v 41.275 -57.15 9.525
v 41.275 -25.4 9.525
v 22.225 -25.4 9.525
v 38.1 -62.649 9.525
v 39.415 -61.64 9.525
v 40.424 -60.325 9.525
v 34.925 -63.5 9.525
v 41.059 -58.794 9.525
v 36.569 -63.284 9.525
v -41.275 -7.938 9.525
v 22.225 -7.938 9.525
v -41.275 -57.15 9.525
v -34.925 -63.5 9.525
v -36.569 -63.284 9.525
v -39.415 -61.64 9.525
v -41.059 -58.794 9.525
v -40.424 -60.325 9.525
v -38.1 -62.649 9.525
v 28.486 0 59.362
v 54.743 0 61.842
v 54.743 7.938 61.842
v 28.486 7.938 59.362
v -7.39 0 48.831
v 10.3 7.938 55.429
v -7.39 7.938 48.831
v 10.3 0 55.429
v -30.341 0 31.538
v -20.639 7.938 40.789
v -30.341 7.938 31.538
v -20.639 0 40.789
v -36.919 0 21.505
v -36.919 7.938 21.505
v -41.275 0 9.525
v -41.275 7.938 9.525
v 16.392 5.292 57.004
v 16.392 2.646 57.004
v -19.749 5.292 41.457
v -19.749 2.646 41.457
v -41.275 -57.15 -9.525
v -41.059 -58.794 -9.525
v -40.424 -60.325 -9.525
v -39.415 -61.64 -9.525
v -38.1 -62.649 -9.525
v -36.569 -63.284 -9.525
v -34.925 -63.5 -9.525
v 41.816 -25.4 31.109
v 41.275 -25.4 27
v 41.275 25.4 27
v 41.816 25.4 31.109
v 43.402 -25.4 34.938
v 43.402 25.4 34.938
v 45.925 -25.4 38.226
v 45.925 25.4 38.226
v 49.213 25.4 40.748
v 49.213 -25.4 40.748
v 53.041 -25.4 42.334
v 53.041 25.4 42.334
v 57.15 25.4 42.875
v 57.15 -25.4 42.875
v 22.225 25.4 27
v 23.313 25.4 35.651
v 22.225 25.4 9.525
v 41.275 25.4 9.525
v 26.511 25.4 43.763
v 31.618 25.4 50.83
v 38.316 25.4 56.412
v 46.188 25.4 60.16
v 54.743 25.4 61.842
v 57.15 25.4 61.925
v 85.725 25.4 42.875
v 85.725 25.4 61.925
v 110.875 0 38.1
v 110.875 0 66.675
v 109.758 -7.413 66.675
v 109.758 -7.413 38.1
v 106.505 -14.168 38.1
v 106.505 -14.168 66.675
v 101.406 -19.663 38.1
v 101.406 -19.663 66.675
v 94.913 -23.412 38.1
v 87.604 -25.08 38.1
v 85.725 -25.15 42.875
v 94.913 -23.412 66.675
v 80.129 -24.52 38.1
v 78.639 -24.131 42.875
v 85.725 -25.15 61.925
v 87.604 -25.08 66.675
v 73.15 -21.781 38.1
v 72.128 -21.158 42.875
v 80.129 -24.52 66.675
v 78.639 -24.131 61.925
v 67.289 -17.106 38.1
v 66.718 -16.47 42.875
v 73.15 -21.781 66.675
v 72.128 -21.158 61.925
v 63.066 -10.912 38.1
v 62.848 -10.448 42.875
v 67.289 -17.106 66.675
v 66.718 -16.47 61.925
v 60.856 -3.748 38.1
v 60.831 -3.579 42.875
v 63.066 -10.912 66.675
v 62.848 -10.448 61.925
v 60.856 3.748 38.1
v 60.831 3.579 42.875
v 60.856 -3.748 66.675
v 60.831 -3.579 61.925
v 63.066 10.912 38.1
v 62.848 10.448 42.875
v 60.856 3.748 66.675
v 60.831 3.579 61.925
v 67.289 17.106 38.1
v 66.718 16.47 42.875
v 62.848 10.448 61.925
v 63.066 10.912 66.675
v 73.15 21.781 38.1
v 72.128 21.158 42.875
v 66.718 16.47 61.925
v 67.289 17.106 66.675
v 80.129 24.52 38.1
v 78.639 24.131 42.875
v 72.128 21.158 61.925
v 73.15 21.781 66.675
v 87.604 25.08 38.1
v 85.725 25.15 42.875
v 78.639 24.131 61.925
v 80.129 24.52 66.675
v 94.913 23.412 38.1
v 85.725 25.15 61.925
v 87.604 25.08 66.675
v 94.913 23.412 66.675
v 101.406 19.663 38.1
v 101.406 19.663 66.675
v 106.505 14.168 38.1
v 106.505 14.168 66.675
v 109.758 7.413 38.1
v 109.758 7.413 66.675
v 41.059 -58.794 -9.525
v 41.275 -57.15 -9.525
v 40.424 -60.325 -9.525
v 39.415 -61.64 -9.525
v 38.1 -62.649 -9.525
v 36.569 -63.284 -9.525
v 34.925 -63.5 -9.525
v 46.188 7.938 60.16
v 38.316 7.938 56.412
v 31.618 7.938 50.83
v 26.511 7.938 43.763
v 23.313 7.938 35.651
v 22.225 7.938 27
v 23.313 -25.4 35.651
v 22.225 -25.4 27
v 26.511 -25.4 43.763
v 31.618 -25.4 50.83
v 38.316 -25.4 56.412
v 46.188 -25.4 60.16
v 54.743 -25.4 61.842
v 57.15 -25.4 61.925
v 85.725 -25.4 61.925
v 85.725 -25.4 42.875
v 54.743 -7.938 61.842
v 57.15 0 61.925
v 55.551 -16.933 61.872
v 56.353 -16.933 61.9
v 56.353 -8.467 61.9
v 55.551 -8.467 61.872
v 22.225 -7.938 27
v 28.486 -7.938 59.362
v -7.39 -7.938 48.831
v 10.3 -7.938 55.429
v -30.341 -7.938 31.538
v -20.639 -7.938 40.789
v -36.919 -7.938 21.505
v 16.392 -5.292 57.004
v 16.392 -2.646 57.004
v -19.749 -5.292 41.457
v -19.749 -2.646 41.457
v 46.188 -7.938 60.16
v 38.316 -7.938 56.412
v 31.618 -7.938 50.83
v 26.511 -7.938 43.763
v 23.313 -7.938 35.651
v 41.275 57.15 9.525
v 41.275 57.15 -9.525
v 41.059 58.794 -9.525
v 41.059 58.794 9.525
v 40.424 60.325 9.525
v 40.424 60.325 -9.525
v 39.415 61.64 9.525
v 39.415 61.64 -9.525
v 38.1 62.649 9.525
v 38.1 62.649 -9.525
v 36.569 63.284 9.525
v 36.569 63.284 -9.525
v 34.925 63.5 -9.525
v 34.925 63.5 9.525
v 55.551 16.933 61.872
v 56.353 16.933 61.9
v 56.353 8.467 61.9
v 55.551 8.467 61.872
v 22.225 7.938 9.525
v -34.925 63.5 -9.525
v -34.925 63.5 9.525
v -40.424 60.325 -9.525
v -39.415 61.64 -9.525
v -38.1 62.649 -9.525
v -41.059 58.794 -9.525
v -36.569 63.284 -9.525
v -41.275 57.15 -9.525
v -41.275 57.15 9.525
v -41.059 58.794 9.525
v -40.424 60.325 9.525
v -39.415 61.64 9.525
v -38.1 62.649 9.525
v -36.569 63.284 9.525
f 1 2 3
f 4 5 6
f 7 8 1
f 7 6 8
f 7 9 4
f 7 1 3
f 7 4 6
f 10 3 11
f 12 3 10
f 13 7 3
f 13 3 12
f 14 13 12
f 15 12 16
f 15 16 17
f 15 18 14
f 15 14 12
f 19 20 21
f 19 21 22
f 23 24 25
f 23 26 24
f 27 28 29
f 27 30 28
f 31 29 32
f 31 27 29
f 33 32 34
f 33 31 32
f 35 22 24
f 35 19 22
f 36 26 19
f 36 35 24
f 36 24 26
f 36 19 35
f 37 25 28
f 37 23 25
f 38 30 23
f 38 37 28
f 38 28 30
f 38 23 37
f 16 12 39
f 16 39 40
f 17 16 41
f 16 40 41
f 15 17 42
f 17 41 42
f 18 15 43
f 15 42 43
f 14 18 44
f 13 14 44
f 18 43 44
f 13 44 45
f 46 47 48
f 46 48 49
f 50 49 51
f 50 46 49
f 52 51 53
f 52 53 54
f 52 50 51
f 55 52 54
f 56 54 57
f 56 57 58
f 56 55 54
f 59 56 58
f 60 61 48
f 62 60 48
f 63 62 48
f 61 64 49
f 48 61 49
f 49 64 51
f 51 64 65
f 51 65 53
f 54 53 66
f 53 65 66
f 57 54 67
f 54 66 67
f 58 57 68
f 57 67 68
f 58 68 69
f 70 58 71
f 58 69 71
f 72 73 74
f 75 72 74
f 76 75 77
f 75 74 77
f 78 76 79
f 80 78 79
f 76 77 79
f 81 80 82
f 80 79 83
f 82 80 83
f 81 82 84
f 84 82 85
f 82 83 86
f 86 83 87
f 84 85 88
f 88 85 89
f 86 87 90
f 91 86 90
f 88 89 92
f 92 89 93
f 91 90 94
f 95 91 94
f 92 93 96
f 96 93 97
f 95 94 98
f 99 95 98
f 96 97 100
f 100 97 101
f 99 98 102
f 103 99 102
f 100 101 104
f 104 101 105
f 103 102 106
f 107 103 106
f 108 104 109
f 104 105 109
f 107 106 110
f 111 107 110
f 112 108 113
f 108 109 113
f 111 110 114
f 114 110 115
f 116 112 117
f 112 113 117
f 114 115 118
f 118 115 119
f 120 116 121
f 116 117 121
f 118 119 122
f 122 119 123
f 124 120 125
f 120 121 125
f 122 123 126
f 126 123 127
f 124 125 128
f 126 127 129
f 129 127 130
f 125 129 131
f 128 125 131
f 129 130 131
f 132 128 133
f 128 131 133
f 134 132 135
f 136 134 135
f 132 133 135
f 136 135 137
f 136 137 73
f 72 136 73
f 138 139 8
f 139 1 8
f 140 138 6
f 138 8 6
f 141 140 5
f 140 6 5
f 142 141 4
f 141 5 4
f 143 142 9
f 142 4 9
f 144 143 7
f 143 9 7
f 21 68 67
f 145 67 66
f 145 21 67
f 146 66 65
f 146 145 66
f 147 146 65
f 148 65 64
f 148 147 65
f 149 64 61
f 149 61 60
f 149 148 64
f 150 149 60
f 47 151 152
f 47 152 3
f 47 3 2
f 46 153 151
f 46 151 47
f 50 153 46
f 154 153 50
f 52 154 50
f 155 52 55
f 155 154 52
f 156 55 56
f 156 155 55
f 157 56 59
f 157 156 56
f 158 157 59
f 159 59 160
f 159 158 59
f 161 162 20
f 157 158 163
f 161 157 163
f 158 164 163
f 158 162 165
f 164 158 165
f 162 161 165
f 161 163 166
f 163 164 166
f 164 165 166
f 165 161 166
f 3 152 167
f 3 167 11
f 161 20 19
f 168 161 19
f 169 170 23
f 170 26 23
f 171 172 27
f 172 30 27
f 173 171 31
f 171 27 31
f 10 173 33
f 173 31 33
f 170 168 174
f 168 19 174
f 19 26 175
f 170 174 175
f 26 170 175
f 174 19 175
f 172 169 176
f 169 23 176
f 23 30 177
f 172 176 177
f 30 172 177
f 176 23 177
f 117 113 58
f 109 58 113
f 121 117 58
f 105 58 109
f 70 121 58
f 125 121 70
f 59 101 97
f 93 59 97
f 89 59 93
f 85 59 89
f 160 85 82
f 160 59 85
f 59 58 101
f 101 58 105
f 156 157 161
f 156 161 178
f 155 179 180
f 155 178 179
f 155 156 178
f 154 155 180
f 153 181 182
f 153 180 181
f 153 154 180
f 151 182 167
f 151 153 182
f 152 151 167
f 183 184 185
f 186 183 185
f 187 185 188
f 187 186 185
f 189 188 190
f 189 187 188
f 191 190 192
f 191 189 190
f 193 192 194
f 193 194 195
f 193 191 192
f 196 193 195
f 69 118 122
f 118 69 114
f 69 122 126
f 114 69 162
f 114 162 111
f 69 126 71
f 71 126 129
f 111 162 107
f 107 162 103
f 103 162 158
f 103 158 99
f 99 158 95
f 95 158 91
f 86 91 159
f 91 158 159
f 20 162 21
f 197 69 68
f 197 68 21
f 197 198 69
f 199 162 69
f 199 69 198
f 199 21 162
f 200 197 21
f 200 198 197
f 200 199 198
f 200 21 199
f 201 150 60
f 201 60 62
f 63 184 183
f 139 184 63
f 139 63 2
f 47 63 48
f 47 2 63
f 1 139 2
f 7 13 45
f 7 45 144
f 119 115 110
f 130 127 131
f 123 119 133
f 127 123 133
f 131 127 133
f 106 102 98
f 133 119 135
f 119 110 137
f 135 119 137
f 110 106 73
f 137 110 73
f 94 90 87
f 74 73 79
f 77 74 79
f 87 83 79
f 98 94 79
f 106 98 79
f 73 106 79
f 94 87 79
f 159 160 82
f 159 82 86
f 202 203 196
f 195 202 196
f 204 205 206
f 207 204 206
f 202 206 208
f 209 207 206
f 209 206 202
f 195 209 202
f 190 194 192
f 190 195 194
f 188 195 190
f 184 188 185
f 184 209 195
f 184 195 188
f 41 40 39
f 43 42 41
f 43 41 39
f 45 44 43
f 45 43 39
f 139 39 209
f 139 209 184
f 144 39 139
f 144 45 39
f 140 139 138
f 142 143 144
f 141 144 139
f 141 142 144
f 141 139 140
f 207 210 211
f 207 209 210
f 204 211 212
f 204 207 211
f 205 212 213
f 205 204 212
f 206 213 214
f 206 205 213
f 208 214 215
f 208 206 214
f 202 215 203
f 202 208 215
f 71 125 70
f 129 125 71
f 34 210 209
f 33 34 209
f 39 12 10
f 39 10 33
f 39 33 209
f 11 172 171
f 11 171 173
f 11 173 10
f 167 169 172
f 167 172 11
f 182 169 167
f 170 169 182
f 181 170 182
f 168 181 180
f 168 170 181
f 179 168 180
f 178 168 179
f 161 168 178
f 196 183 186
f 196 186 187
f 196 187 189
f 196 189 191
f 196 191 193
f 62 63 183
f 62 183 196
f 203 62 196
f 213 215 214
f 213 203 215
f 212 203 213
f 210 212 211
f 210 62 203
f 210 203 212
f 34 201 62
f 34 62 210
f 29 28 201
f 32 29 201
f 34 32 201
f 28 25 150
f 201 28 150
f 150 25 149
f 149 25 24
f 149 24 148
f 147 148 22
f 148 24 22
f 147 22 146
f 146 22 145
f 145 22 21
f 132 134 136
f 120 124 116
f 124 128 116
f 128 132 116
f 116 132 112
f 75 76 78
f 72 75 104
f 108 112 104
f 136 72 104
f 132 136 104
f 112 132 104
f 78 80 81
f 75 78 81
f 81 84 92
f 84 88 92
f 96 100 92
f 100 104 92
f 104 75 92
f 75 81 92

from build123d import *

# Parameters (mm, degrees)
F1_DEPTH = 63.5
F2_DEPTH = 25.4
F3_DEPTH = 7.9375
F0_W     = 25.6498904824
F0_H     = 19.05
F4_DEPTH = 25.4
F6_R     = 6.35


with BuildPart() as f1:
    # F0 (on Front) → F1 (new body, symmetric)
    with BuildSketch(Plane.XZ):
        Polygon((41.275, -9.525), (41.275, 9.525), (22.225, 9.525), (-41.275, 9.525), (-41.275, -9.525), align=None)
    extrude(amount=F1_DEPTH, both=True)

    # F0 (on Front) → F2 (join, symmetric)
    with BuildSketch(Plane.XZ):
        with BuildLine():
            Line((22.225, 9.525), (41.275, 9.525))
            Line((41.275, 9.525), (41.275, 27.0002))
            ThreePointArc((41.275, 27.0002), (45.9246798487, 38.2255201513), (57.15, 42.8752))
            Line((57.15, 42.8752), (60.0751095176, 42.8752))
            Line((60.0751095176, 42.8752), (60.0751095176, 61.9252))
            Line((60.0751095176, 61.9252), (57.15, 61.9252))
            add(Edge.make_bspline(
                [(57.15, 61.9252), (56.3562246921, 61.9012944132), (55.5537204814, 61.8737200554), (54.7431620422, 61.8421683147)],
                knots=[0, 0, 0, 0, 2.5014710885, 2.5014710885, 2.5014710885, 2.5014710885], degree=3))
            ThreePointArc((54.7431620422, 61.8421683147), (31.617526161, 50.8297699639), (22.225, 27.0002))
            Line((22.225, 27.0002), (22.225, 9.525))
        make_face()
    extrude(amount=F2_DEPTH, both=True)

    # F0 (on Front) → F3 (join, symmetric)
    with BuildSketch(Plane.XZ):
        with BuildLine():
            Line((-41.275, 9.525), (22.225, 9.525))
            Line((22.225, 9.525), (22.225, 27.0002))
            ThreePointArc((22.225, 27.0002), (31.617526161, 50.8297699639), (54.7431620422, 61.8421683147))
            add(Edge.make_bspline(
                [(54.7431620422, 61.8421683147), (19.4226041922, 60.4672827696), (-31.1915768934, 51.5400171012), (-41.275, 9.525)],
                knots=[2.5014710885, 2.5014710885, 2.5014710885, 2.5014710885, 111.5045361635, 111.5045361635, 111.5045361635, 111.5045361635], degree=3))
        make_face()
    extrude(amount=F3_DEPTH, both=True)

    # F0 (on Front) → F4 (join, symmetric)
    with BuildSketch(Plane.XZ):
        with Locations((72.9000547588, 52.4002)):
            Rectangle(F0_W, F0_H)
    extrude(amount=F4_DEPTH, both=True)

    # F0 (on Front) → F5 (revolve)
    with BuildSketch(Plane.XZ):
        Polygon((85.725, 61.9252), (85.725, 42.8752), (85.725, 38.1), (110.8751095176, 38.1), (110.8751095176, 66.675), (85.725, 66.675), align=None)
    revolve(axis=Axis((85.725, 0, 52.3875), (0, 0, -1)))

    # F6
    f6_edges = [f1.edges().sort_by_distance(p)[0] for p in [
        (41.275, -63.5, 0),
        (-41.275, -63.5, 0),
        (41.275, 63.5, 0),
        (-41.275, 63.5, 0),
    ]]
    fillet(f6_edges, radius=F6_R)


solid = f1.part
